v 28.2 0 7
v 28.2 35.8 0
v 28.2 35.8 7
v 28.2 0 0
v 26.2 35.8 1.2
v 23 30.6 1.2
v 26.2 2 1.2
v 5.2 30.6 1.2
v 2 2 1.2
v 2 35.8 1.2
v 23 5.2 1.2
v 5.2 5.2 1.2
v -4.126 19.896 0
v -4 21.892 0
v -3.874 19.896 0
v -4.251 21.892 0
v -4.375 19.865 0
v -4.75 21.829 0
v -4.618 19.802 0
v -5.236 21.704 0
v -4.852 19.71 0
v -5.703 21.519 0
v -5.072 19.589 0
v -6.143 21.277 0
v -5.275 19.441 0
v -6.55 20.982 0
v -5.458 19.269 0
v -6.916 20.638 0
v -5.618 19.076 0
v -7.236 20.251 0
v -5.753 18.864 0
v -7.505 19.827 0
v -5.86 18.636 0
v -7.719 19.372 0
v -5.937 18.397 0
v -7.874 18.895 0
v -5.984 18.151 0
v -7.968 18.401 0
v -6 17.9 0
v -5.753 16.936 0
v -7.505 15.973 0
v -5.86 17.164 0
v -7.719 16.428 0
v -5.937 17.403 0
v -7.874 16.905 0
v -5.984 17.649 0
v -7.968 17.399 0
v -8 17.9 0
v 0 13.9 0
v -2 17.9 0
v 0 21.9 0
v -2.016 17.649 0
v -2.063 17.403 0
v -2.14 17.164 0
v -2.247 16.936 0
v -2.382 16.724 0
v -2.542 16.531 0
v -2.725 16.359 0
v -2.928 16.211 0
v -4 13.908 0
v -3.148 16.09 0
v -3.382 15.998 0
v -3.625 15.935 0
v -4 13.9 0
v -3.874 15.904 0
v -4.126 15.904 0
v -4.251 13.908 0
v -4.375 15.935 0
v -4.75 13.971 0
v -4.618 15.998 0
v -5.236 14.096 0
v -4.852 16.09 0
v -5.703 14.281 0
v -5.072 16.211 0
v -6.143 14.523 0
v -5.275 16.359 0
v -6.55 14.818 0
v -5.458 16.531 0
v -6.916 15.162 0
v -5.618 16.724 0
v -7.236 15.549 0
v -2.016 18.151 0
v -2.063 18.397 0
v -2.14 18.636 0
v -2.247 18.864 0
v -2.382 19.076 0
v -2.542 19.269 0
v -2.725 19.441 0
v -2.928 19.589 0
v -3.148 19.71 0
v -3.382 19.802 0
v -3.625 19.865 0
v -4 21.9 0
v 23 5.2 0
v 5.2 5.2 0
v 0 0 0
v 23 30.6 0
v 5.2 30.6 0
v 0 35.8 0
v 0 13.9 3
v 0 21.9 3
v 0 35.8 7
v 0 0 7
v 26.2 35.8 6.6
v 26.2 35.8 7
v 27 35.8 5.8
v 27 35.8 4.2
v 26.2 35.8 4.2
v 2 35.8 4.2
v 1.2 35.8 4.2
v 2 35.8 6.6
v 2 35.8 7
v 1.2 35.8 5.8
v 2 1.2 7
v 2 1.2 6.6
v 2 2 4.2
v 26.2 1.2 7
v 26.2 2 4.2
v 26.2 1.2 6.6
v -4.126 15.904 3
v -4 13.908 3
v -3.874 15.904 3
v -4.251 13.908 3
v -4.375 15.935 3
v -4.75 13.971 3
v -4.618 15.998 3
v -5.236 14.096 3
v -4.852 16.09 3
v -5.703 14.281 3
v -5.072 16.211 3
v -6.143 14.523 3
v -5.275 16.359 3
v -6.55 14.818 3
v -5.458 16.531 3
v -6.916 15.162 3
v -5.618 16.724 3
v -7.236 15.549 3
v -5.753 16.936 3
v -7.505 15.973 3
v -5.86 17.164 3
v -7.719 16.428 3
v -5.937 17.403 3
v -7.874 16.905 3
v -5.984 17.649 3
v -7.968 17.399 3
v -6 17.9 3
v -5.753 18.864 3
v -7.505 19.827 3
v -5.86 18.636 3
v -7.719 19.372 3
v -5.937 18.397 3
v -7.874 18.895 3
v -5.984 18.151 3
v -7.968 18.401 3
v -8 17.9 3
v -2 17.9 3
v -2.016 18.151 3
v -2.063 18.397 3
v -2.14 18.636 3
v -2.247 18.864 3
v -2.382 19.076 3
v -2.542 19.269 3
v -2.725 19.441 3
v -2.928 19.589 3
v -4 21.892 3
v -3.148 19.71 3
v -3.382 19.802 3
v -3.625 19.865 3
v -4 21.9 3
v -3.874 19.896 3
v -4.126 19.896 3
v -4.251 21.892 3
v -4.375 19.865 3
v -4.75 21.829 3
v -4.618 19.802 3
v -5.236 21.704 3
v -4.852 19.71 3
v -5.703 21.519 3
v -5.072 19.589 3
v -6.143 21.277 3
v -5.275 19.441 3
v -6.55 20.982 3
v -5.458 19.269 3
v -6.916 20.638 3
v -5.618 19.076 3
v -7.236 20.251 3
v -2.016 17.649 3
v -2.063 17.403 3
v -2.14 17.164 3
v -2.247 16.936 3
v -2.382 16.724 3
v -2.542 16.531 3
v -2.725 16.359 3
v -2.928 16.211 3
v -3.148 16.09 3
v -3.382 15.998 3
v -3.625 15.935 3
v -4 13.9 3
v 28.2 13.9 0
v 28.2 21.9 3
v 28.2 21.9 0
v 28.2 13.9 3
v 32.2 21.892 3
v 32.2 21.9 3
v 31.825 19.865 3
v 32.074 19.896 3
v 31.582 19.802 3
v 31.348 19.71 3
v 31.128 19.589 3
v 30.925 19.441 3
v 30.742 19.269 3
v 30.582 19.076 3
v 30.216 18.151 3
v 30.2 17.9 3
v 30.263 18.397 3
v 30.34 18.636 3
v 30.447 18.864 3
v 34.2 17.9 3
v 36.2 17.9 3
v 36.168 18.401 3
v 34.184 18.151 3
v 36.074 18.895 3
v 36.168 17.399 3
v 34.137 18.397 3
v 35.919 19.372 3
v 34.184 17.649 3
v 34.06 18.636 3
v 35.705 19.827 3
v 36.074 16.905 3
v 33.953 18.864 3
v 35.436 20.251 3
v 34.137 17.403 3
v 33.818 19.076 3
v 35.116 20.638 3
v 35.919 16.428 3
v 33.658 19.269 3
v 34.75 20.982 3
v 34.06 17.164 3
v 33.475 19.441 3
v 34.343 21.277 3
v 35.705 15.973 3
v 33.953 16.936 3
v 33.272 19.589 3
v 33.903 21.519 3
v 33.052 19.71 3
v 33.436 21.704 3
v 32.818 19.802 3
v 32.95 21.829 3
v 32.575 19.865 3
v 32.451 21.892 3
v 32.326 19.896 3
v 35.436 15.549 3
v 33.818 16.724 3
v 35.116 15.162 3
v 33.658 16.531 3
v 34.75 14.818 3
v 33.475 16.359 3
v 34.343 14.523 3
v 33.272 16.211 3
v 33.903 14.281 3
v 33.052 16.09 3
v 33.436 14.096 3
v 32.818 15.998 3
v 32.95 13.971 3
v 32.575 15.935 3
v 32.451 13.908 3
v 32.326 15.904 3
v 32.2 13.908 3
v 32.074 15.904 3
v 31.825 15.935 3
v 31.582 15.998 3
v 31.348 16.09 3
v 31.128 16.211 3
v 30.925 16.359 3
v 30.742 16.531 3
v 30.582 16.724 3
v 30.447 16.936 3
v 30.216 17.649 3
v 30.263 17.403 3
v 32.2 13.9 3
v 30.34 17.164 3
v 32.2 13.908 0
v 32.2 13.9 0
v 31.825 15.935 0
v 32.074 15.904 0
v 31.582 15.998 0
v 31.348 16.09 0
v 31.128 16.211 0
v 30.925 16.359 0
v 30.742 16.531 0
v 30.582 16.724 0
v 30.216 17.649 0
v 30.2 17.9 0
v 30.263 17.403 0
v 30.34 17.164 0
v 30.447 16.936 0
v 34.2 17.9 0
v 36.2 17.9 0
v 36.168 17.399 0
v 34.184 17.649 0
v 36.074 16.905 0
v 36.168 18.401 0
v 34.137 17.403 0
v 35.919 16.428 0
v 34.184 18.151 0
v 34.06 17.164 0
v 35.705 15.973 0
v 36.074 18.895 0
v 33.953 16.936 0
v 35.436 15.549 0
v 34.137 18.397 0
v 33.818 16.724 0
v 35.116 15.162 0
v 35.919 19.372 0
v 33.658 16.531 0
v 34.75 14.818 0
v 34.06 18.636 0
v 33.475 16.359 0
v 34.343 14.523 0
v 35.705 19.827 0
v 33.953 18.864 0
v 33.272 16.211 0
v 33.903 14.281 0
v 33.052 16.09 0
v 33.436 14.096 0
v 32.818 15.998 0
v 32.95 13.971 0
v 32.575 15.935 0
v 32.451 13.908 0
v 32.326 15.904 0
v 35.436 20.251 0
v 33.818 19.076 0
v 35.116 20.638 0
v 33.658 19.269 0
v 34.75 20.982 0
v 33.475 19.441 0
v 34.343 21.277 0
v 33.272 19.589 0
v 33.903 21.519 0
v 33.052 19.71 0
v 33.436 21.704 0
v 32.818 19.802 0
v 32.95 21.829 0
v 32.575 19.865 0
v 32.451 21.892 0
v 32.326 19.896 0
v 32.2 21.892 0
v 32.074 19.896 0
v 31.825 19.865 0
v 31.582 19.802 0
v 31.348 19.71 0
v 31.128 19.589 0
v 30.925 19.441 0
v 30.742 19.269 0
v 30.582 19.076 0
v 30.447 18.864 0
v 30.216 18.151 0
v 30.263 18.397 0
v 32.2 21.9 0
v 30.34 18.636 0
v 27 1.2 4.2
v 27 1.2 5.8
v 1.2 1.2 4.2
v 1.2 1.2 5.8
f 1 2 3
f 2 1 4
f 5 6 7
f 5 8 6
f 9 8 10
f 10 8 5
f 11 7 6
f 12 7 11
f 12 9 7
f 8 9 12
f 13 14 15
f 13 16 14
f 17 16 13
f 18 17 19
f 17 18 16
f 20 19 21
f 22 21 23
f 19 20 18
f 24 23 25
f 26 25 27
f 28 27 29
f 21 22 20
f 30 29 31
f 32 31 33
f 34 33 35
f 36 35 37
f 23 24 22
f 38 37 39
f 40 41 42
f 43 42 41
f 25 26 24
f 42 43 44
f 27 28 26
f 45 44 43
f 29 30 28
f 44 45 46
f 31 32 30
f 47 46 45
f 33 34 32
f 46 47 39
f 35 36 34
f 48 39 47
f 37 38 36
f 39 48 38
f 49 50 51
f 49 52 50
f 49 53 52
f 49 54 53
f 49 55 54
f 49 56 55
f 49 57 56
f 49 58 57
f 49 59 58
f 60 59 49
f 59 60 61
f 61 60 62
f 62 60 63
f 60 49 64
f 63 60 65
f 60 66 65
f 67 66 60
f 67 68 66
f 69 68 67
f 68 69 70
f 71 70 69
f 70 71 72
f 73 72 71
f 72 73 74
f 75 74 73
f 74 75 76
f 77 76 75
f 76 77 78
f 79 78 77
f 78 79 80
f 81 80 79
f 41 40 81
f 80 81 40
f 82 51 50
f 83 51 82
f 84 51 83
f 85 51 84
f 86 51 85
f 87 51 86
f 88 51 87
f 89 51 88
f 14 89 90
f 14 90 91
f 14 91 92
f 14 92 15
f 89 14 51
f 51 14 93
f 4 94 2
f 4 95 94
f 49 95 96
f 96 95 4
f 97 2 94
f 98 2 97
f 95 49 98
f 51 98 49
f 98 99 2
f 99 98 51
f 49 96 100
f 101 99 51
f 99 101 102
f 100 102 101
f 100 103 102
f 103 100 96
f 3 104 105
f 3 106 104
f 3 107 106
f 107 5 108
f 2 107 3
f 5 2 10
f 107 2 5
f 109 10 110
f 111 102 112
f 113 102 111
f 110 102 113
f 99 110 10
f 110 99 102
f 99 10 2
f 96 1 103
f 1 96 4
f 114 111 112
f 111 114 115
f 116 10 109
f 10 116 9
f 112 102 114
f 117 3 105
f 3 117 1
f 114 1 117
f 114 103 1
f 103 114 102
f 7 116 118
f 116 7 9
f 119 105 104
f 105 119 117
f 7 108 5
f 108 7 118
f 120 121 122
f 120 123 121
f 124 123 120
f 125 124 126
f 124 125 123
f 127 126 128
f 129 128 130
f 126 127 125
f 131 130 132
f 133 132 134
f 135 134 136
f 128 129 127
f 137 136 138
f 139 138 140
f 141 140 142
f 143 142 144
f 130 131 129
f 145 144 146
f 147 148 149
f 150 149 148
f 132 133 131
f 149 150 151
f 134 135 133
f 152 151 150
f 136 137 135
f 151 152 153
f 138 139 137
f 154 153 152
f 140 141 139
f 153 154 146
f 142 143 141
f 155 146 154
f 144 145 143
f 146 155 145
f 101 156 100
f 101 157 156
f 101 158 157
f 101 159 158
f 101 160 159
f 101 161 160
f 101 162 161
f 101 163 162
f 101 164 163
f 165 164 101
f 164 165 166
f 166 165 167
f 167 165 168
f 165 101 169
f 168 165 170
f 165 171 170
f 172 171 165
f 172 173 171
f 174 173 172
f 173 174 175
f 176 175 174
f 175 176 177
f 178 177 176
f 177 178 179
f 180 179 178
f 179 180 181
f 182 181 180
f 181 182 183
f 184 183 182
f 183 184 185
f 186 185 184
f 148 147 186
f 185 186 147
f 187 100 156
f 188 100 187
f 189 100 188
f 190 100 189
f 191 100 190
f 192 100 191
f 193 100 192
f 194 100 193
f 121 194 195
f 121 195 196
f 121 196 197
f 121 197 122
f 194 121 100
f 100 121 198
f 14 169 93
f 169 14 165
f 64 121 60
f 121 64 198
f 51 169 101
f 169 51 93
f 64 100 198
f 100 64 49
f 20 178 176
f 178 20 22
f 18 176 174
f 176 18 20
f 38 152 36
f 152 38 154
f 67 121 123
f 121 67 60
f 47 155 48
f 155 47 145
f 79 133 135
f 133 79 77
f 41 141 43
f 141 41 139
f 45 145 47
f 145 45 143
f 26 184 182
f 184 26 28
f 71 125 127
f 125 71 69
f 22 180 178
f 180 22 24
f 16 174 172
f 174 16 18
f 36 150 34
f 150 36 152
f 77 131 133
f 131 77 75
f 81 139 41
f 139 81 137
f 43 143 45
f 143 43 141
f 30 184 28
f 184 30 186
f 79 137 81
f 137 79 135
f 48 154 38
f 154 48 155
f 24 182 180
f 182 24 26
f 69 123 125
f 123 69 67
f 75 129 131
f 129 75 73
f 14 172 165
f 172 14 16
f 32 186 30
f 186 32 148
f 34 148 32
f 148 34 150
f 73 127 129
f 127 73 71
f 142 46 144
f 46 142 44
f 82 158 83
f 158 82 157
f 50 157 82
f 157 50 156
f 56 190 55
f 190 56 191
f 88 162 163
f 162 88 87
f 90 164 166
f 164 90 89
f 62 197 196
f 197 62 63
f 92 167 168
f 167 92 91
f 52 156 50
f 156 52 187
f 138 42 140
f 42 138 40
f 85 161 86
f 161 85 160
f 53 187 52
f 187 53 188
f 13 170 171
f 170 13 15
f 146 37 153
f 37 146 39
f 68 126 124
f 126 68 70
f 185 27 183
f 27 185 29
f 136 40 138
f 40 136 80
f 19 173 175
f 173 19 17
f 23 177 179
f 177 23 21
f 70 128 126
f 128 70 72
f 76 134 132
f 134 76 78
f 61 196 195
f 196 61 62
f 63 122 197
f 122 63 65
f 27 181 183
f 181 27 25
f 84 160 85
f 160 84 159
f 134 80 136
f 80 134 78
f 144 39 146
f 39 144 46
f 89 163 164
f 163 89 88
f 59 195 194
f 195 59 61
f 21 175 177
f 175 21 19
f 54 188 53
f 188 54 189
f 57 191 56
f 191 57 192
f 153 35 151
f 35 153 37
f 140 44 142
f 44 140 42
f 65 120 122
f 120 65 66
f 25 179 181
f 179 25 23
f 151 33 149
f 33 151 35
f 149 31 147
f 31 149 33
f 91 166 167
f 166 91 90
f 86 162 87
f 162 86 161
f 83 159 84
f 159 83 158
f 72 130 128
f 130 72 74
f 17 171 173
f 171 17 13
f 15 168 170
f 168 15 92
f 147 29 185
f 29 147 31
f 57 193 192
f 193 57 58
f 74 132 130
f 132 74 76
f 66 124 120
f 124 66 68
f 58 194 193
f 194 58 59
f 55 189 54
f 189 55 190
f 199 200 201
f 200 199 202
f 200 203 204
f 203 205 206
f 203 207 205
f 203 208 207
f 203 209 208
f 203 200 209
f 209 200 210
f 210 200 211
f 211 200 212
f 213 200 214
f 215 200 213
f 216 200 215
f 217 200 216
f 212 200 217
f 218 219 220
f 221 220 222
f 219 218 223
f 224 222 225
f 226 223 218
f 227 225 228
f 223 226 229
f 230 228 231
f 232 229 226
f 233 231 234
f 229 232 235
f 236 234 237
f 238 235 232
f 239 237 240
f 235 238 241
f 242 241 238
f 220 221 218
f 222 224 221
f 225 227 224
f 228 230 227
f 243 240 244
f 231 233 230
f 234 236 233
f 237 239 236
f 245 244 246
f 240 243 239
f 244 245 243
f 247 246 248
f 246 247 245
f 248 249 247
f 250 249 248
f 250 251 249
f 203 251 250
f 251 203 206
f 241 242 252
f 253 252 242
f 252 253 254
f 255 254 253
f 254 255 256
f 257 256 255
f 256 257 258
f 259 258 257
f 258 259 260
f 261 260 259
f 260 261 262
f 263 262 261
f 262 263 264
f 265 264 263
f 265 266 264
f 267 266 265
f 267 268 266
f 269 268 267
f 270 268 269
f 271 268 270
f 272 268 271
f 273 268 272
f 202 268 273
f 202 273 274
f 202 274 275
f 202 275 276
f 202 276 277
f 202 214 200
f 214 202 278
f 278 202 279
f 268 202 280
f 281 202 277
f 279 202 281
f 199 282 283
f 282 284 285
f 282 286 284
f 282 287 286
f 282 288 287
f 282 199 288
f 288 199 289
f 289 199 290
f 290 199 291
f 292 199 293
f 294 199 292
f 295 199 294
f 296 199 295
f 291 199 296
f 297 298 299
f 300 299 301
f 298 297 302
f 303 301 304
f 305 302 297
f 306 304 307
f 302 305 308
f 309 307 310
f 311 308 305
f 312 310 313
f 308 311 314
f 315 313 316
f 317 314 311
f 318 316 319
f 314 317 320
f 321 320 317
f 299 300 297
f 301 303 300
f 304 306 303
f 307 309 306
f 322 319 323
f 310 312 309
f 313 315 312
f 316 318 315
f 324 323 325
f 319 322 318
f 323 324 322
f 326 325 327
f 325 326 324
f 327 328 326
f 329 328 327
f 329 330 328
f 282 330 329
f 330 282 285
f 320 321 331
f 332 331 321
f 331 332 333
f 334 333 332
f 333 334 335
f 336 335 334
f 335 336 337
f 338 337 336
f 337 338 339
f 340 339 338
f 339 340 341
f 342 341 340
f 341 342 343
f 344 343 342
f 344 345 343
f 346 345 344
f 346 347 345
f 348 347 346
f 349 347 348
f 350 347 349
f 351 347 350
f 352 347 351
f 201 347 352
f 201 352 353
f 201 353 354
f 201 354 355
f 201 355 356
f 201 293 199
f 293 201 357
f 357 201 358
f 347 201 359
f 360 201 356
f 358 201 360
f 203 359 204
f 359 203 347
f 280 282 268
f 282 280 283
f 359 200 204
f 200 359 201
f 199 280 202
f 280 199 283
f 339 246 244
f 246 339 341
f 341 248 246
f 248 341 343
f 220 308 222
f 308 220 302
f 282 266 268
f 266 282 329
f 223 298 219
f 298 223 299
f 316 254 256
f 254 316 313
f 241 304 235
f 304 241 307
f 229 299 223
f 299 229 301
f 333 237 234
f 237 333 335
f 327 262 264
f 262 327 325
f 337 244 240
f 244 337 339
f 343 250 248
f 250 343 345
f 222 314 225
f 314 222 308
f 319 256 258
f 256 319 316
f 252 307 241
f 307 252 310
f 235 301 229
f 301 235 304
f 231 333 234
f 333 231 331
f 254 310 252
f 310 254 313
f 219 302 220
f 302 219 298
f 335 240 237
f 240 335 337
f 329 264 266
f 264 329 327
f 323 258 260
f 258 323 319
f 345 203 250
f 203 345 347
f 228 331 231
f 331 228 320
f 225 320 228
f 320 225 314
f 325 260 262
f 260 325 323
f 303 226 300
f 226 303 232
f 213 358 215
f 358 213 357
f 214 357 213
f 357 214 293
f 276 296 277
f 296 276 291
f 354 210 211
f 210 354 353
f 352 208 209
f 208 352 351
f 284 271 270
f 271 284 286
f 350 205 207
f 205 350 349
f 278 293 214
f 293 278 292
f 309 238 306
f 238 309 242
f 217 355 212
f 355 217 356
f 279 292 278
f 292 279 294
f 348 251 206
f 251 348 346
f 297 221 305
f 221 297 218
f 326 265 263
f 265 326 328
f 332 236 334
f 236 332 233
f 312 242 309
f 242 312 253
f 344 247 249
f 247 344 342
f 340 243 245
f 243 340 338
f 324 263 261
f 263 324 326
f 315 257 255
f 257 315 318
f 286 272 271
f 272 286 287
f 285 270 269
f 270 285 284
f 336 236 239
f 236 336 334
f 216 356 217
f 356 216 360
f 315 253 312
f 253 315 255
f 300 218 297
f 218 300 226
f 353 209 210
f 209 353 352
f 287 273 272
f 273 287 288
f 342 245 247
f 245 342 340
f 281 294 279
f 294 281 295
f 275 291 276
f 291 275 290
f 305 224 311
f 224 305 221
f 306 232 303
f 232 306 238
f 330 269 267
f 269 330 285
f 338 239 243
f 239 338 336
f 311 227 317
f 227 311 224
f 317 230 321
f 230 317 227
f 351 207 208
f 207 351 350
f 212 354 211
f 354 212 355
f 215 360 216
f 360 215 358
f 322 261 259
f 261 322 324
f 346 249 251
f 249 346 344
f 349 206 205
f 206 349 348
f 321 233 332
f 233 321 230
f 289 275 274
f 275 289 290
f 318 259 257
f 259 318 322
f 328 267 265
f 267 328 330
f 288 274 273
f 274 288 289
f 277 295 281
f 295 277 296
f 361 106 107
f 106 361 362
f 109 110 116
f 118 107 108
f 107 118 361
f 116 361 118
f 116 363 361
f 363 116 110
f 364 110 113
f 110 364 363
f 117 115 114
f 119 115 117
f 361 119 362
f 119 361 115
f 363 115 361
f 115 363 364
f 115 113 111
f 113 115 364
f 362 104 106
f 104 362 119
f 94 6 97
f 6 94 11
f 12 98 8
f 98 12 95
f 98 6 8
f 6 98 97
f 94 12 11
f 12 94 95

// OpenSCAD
// file: ../lib/pcb_led_cvf.scad
// for led power module modified

/* bluetooth_mate_holder.scad
 * By John Biehler - November 17, 2011
 * http://www.thingiverse.com/thing:

 * derived from pcb_box_slide_with_tabs.scad
 * By Nicholas C Lewis - Jan 1, 2011
 * http://www.thingiverse.com/thing:5396
 *
 * derived from pcb_box_slide.scad
 *     Parametric, open PCB-box (slide-in) by chlunde
 *     http://www.thingiverse.com/thing:4071
 *
 * CHANGES
 * - adjusted to fit Arduino Mega
 * - added mounting tabs
 * - turned off cutouts
 * - adjusted bottom cutout size
 */

$fn=50;

module pcb_led_cvf(

	pcb_width = 48.2,
	pcb_length =24.1,
	pcb_height =1.1,
	slisse = 0.8,

	pcb_bottom_margin = 1,
	wall_width_thick = 2,
	box_height = 7,

	//tab parameters
	tab_hole_radius=2,
	tab_outer_radius=4,

	inner_margin = 4,

	add_tabs = true

) {
	wall_width = wall_width_thick-slisse;

module tab() {
	difference(){
		union() {
			translate([-tab_outer_radius,-tab_outer_radius,0])
			cube([tab_outer_radius,2*tab_outer_radius,wall_width_thick+1]);
			translate([-tab_outer_radius,0,0])
				cylinder(r=tab_outer_radius, h = wall_width_thick+1);
		}
		translate([-tab_outer_radius,0,0]) {
			cylinder(r= tab_hole_radius, h = wall_width_thick+5,center=true);
		}
	}

}

module box() {
	union() {
		cube([pcb_width + 2*wall_width, pcb_length + 2*wall_width, wall_width]);

		cube([wall_width_thick, pcb_length + 2*wall_width, box_height]);

		cube([pcb_width + 2*wall_width, wall_width_thick, box_height]);

		%translate([0, pcb_length+wall_width, 0])
			cube([pcb_width + 2*wall_width,wall_width,box_height]);

		translate([pcb_width + wall_width - slisse,0,0])
			cube([wall_width_thick, pcb_length + 2*wall_width, box_height]);
	}
	if(add_tabs) {
//comment out this part to remove tabs
		for(i=[(pcb_length + 2*wall_width)/2]){
	translate([0,i,0])tab();
	translate([pcb_width + 2*wall_width,i,0])mirror()tab();
		}
	}

}

module pcb() {
	translate([wall_width, wall_width, wall_width + pcb_bottom_margin])
		cube([pcb_width,pcb_length + wall_width + 0.1,pcb_height]);
	translate([wall_width, wall_width, wall_width + pcb_bottom_margin+pcb_height])rotate([0,45,0])
		cube([pcb_height,pcb_length + wall_width + 0.1,pcb_height]);
	translate([wall_width+pcb_width-2*cos(45)*pcb_height, wall_width, wall_width + pcb_bottom_margin+pcb_height])rotate([0,45,0])
		cube([pcb_height,pcb_length + wall_width + 0.1,pcb_height]);
	translate([wall_width_thick, wall_width, wall_width + pcb_bottom_margin])
		cube([pcb_width-2*slisse,pcb_length + wall_width + 0.1,box_height]);

}



module holes() {
		*translate([wall_width + pcb_width/2, wall_width_thick + 0.1, pcb_width/2+wall_width])
			rotate(a=90,v=[1,0,0])
				cylinder(r=pcb_width/2, h=wall_width_thick + 0.2);

		*translate([-0.1, wall_width + pcb_length/2, pcb_length/2 + wall_width])
			rotate(a=90,v=[0,1,0])
				cylinder(r=pcb_length/2, h=wall_width_thick + 0.2);

		*translate([pcb_width + wall_width - slisse - 0.1, wall_width + pcb_length/2, pcb_length/2 + wall_width])
			rotate(a=90,v=[0,1,0])
				cylinder(r=pcb_length/2, h=wall_width_thick + 0.2);

	 * translate([pcb_width/2 + wall_width, wall_width + pcb_length/2, -0.1])
			rotate(a=0,v=[0,1,0])
				cylinder(r=min(pcb_length,pcb_width)/2 - wall_width/2, h=wall_width_thick + 0.2);

		translate([inner_margin +wall_width, inner_margin+wall_width, -0.1])
			cube([pcb_width-inner_margin*2,pcb_length -inner_margin*2,wall_width + 0.2]);
}

	difference() {
		box();
		pcb();
		holes();
	}
}



pcb_led_cvf();
// main file
use <../lib/pcb_led_cvf.scad>


pcb_led_cvf(
  pcb_length=33.4,
  pcb_width=25.8,
  pcb_height=1.6,
  pcb_bottom_margin=3
);
